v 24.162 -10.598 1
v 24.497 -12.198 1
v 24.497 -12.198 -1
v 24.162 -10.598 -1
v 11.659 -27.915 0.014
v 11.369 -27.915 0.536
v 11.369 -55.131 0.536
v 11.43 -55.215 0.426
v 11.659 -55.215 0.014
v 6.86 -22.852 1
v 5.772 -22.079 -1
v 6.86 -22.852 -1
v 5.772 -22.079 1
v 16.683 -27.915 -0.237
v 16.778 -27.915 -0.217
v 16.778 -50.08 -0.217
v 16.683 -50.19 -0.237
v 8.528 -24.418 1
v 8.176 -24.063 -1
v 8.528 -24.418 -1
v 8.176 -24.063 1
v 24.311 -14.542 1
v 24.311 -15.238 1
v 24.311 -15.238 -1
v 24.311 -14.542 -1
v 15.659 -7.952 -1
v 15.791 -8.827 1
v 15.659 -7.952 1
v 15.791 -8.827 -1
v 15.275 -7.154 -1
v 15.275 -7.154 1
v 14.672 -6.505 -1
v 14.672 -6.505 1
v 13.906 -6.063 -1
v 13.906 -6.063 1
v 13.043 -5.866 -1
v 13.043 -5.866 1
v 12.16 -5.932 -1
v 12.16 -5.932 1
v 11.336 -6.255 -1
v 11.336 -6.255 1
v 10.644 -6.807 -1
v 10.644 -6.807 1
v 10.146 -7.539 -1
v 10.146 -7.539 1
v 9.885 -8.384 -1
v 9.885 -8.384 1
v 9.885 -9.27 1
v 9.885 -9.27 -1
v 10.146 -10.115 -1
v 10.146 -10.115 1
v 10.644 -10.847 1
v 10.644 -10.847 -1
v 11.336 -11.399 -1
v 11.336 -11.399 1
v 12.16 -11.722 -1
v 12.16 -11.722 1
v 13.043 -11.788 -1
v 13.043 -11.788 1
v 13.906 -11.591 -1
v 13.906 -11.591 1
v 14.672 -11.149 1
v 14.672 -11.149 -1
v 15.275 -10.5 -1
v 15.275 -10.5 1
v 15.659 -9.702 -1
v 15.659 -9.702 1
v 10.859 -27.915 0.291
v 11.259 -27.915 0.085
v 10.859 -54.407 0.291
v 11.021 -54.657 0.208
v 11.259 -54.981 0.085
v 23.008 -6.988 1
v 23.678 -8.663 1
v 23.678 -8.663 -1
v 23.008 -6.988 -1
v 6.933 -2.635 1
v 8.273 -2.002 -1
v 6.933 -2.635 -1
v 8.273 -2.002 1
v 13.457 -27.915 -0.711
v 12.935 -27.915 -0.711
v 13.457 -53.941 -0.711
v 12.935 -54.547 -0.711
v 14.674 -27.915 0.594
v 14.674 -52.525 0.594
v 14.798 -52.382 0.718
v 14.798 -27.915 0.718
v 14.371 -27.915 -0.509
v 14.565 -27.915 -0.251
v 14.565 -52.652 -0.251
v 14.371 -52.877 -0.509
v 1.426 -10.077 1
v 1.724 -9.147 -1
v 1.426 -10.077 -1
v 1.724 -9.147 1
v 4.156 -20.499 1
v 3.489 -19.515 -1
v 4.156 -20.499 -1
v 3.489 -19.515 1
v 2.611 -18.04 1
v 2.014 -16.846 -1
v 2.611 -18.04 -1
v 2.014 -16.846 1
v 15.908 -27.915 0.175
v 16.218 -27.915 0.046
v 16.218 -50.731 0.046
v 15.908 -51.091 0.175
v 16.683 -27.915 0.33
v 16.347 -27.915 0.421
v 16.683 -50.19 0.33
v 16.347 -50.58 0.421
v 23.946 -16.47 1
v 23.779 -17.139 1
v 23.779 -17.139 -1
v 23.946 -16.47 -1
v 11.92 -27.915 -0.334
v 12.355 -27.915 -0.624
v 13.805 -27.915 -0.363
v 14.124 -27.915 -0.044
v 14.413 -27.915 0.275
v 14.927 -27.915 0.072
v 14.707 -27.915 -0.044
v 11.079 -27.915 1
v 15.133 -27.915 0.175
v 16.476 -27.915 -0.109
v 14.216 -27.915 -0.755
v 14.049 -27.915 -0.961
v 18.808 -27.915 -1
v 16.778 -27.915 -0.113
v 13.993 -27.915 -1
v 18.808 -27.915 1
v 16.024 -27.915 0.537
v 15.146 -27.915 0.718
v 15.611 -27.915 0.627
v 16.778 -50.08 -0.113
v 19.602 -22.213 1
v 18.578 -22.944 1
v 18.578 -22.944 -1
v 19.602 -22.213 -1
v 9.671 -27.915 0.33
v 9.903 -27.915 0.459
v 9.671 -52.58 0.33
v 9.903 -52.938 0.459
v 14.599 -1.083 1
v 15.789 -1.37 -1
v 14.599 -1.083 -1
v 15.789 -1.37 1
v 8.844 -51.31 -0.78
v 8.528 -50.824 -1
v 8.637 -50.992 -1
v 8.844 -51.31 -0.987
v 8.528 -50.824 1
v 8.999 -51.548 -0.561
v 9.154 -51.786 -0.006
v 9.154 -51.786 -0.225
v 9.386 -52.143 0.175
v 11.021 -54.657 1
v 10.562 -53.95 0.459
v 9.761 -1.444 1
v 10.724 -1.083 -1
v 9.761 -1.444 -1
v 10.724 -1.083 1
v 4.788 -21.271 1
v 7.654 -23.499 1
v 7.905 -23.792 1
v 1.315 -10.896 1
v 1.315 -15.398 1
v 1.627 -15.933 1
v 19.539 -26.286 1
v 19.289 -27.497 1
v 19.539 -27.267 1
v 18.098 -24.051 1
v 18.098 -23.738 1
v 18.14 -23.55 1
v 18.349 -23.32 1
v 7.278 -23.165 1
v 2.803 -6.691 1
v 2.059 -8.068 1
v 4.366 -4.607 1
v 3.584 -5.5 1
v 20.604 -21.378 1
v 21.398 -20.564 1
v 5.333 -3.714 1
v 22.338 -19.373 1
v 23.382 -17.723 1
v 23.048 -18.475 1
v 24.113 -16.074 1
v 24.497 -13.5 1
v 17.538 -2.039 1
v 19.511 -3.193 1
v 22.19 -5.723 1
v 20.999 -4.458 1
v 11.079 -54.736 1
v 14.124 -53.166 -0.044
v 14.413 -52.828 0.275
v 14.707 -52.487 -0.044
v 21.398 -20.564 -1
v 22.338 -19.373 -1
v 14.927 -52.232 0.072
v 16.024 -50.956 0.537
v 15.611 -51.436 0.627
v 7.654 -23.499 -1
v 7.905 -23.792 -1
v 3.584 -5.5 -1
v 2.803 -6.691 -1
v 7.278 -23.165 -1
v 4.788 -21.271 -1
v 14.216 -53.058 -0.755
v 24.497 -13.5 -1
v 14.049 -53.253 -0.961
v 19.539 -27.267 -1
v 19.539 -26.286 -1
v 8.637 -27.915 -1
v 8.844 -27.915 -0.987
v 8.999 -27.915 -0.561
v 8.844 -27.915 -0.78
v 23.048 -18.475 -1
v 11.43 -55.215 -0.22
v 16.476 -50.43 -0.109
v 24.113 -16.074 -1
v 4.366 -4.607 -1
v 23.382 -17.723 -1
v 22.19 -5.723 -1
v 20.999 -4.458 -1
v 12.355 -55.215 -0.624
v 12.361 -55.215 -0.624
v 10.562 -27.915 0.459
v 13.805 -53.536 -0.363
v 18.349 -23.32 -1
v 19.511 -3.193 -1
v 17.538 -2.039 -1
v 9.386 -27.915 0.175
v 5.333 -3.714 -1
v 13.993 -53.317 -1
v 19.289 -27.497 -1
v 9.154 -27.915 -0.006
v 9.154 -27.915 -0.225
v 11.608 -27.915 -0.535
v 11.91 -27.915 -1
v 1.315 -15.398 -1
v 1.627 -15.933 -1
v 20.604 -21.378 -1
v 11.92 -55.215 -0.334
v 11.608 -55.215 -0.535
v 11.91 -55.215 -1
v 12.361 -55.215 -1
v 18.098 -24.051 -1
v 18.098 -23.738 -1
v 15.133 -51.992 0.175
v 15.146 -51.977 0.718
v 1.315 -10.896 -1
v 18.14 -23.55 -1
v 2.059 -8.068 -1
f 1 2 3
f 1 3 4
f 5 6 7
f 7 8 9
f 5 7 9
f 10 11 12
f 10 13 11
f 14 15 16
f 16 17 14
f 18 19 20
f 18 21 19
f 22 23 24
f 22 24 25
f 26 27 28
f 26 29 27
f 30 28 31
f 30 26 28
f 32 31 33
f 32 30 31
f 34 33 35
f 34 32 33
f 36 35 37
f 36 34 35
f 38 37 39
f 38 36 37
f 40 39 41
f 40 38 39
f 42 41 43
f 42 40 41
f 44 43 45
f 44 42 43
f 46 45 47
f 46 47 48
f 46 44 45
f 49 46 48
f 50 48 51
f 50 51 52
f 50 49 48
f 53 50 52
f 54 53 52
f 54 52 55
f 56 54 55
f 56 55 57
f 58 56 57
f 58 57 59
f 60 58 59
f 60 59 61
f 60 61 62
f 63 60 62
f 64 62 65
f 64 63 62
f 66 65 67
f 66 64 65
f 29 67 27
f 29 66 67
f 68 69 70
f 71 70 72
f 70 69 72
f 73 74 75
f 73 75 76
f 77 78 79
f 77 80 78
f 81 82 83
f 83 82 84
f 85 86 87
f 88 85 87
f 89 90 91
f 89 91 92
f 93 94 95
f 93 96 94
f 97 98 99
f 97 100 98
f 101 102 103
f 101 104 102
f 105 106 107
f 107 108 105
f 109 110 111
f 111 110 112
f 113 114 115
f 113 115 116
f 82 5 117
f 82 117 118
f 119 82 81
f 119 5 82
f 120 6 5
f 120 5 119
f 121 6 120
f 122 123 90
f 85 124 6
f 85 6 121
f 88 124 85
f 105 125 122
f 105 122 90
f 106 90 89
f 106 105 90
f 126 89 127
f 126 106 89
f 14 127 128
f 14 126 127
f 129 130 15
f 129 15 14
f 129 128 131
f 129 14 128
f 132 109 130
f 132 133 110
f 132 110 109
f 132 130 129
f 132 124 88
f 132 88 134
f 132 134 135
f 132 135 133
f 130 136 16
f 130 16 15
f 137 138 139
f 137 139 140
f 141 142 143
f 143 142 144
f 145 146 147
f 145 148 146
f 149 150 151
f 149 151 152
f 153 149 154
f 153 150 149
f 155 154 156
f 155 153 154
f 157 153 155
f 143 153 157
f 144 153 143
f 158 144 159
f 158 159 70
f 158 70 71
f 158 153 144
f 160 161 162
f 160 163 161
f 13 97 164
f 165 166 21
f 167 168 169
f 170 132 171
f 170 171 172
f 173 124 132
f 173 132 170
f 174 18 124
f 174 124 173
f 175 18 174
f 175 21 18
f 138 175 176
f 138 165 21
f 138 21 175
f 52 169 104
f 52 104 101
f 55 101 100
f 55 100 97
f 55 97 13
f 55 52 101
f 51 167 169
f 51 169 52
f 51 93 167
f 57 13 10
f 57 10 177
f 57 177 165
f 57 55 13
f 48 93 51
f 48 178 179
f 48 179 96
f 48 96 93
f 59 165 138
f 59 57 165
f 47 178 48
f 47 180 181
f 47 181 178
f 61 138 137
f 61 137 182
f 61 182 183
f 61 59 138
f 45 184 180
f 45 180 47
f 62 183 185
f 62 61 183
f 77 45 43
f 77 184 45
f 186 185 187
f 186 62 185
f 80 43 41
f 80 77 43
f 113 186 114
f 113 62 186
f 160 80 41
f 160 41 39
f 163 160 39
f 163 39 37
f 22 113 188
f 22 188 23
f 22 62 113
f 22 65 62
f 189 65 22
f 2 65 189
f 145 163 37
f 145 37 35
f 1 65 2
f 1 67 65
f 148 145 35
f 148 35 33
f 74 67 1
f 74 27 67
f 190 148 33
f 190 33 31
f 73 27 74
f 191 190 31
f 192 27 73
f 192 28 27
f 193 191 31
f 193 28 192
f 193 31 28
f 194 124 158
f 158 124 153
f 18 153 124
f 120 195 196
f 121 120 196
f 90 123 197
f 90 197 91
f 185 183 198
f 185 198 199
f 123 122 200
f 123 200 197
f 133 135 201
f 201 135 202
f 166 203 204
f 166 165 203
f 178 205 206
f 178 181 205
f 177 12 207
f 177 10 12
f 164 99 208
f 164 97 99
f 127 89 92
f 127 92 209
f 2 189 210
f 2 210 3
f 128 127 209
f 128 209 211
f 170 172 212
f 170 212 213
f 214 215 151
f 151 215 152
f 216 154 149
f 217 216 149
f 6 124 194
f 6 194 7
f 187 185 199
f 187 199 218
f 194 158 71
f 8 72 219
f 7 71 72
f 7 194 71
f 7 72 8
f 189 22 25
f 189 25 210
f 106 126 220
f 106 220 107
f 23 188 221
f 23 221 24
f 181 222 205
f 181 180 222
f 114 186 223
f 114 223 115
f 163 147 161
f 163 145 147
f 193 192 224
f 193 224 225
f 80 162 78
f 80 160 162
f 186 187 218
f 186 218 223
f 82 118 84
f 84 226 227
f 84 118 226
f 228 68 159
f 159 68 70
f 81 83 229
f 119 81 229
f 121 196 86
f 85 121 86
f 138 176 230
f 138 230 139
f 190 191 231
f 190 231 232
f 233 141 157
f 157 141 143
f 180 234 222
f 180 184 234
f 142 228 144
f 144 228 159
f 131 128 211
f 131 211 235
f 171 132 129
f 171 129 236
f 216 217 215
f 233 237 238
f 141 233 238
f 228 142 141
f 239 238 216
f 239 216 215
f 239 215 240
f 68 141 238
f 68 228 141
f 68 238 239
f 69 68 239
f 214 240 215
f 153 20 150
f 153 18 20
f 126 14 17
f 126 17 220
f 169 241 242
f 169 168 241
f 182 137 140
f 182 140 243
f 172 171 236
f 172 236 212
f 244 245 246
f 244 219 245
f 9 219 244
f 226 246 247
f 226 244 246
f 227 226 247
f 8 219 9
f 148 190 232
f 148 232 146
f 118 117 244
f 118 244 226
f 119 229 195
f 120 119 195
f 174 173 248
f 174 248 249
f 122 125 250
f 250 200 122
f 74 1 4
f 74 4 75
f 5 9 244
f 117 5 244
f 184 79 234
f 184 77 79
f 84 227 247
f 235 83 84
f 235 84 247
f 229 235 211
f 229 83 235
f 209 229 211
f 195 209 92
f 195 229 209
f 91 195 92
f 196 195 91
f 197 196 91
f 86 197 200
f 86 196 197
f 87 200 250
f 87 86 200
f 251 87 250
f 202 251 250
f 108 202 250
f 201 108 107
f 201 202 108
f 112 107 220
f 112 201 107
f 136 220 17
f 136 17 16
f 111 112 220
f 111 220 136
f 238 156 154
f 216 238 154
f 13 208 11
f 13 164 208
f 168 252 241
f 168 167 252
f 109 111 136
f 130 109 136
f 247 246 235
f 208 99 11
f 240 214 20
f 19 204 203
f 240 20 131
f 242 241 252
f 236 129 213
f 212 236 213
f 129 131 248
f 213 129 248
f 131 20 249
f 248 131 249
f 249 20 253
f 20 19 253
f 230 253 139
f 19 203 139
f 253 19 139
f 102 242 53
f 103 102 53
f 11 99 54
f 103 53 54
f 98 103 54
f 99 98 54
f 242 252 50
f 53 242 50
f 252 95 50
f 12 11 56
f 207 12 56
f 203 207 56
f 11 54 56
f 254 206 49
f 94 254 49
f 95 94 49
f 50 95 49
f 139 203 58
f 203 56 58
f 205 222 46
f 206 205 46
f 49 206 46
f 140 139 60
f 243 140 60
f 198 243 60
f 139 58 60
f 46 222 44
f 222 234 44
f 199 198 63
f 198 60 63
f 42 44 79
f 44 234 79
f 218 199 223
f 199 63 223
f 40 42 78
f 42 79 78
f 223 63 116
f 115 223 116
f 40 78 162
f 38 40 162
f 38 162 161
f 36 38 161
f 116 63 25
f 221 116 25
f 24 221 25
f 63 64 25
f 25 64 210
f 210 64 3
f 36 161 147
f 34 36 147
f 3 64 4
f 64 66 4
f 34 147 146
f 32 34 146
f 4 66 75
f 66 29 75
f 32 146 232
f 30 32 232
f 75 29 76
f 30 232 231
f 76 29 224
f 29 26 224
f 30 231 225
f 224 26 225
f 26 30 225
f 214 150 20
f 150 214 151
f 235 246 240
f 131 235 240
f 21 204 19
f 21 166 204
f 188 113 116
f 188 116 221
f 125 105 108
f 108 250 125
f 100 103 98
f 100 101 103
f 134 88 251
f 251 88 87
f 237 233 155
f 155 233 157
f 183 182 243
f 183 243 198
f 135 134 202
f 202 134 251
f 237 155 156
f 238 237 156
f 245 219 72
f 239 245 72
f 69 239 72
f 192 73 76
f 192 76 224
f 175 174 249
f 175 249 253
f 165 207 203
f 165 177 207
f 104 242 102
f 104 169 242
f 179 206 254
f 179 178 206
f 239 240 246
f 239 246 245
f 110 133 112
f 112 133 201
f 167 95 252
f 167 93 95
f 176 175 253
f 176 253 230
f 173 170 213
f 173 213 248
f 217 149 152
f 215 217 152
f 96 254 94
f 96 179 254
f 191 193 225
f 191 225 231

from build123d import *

# Parameters (mm, degrees)
F0_R     = 2.9695482625
F1_DEPTH = 1
F4_DEPTH = 27.3


with BuildPart() as f1:
    # F0 (on Top) → F1 (new body, symmetric)
    with BuildSketch(Plane.XY):
        Polygon((12.3607597711, -55.2147076325), (16.7780640493, -50.0796457731), (16.7780640493, -27.9147076325), (18.8081849192, -27.9147076325), (19.2885116058, -27.4970311455), (19.5391171796, -27.2673100327), (19.5391171796, -26.9958199979), (19.5391171796, -26.7243331464), (19.5391171796, -26.2857721985), (18.0981371197, -24.0512096784), (18.0981371197, -23.7379539049), (18.1399044501, -23.5500001224), (18.3487426936, -23.3202774179), (18.5784638064, -22.9443698531), (19.601768971, -22.2134375926), (20.6041896746, -21.3780878021), (21.3977721348, -20.5636208809), (22.3375426387, -19.3732463948), (23.0475904382, -18.475244813), (23.3817306727, -17.7234280915), (23.7785211069, -17.1386838748), (23.94559202, -16.4704034057), (24.1126613415, -16.0736113798), (24.3107286721, -15.2382599976), (24.3107286721, -14.5422572011), (24.4967819861, -13.5003595977), (24.4967819861, -12.1979863997), (24.1618857025, -10.5979288543), (23.6781480411, -8.6629758211), (23.0083570657, -6.9884967909), (22.1897215291, -5.723335529), (20.9989809561, -4.4581734713), (19.5105560358, -3.1930120105), (17.5383918623, -2.0394821799), (15.7894929391, -1.3696908066), (14.5987523661, -1.0832198235), (10.7237476301, -1.0832198235), (9.7613685895, -1.4441120924), (8.2729436691, -2.0022716365), (6.9333601266, -2.6348524664), (5.3333029791, -3.7139610111), (4.3658260647, -4.6070164409), (3.5844024642, -5.5000718706), (2.8029794606, -6.6908124435), (2.0587666025, -8.0676063305), (1.7238711148, -9.1467142784), (1.4261855736, -10.0769800525), (1.3145539433, -10.8956139975), (1.3145539433, -11.6398272535), (1.3145539433, -15.3981014905), (1.6272404915, -15.9329066809), (2.0135845171, -16.8460833601), (2.6106608878, -18.0402364995), (3.4887149126, -19.5153676908), (4.1560359953, -20.498788485), (4.7882354184, -21.2714753424), (5.7716558147, -22.079285849), (6.8604427815, -22.851974298), (7.2781184726, -23.1652316632), (7.6540260375, -23.4993718978), (7.9046308155, -23.7917448019), (8.1761200545, -24.0632332451), (8.5280640493, -24.418256349), (8.5280640493, -24.8359328359), (8.5280640493, -25.2878464051), (8.5280640493, -50.8238519687), (11.0211762286, -54.6565492822), (11.4304932011, -55.2147076325), (11.8025998291, -55.2147076325), align=None)
        with Locations((12.8210000694, -8.8269943371)):
            Circle(F0_R, mode=Mode.SUBTRACT)
    extrude(amount=F1_DEPTH, both=True)

    # F3 (on offset) → F4 (cut)
    with BuildSketch(Plane.XZ.offset(55.2147076325)):
        Polygon((17.2618441284, 1.6106185503), (7.4076484889, 1.6106185503), (7.2416369803, -2.3955139332), (17.2618441284, -2.3955139332), align=None)
        Polygon((8.4565682159, -1), (8.5280640493, 1), (11.0793640826, 1), (11.3692851097, 0.5361280251), (11.6591977943, 0.0142720533), (11.9201283872, -0.3336319279), (12.3550099279, -0.623552955), (12.9348519822, -0.7105284289), (13.4567048255, -0.7105284289), (13.804606721, -0.3626244477), (14.1235181824, -0.0437119435), (14.4134392095, 0.2751995178), (14.6743698024, 0.594112022), (14.7975728908, 0.7176237855), (15.1462589881, 0.7176237855), (15.6111821269, 0.6272226434), (16.0244438949, 0.5368215013), (16.3473055636, 0.4205907166), (16.6830815322, 0.3301895745), (16.7993144025, -0.2122183209), (16.6828928362, -0.237166359), (16.4764527338, -0.1089018361), (16.2181625646, 0.0460718483), (15.9082151958, 0.1752158901), (15.5853535271, 0.1752158901), (15.1333446882, 0.1752158901), (14.9267158898, 0.0719004481), (14.7071727916, -0.0443292938), (14.5651071501, -0.2509612206), (14.3713926517, -0.509250347), (14.2164210529, -0.7546251735), (14.0485268117, -0.9612571003), (13.9193838127, -1.0516582424), (11.9434709008, -1.0516582424), (11.6076991035, -0.5350799896), (11.2590046637, 0.084814748), (10.8586530244, 0.2914466748), (10.5616241267, 0.4593346591), (10.2258439869, 0.4593346591), (9.9029864894, 0.4593346591), (9.6705290913, 0.3301895745), (9.386406151, 0.1752158901), (9.1539487529, -0.0055863941), (9.1539487529, -0.2251326208), (8.9989771541, -0.5609085894), (8.8439972128, -0.7804548161), (8.8439972128, -0.9870857001), (8.6373684144, -1), align=None, mode=Mode.SUBTRACT)
    extrude(amount=-F4_DEPTH, mode=Mode.SUBTRACT)


solid = f1.part
